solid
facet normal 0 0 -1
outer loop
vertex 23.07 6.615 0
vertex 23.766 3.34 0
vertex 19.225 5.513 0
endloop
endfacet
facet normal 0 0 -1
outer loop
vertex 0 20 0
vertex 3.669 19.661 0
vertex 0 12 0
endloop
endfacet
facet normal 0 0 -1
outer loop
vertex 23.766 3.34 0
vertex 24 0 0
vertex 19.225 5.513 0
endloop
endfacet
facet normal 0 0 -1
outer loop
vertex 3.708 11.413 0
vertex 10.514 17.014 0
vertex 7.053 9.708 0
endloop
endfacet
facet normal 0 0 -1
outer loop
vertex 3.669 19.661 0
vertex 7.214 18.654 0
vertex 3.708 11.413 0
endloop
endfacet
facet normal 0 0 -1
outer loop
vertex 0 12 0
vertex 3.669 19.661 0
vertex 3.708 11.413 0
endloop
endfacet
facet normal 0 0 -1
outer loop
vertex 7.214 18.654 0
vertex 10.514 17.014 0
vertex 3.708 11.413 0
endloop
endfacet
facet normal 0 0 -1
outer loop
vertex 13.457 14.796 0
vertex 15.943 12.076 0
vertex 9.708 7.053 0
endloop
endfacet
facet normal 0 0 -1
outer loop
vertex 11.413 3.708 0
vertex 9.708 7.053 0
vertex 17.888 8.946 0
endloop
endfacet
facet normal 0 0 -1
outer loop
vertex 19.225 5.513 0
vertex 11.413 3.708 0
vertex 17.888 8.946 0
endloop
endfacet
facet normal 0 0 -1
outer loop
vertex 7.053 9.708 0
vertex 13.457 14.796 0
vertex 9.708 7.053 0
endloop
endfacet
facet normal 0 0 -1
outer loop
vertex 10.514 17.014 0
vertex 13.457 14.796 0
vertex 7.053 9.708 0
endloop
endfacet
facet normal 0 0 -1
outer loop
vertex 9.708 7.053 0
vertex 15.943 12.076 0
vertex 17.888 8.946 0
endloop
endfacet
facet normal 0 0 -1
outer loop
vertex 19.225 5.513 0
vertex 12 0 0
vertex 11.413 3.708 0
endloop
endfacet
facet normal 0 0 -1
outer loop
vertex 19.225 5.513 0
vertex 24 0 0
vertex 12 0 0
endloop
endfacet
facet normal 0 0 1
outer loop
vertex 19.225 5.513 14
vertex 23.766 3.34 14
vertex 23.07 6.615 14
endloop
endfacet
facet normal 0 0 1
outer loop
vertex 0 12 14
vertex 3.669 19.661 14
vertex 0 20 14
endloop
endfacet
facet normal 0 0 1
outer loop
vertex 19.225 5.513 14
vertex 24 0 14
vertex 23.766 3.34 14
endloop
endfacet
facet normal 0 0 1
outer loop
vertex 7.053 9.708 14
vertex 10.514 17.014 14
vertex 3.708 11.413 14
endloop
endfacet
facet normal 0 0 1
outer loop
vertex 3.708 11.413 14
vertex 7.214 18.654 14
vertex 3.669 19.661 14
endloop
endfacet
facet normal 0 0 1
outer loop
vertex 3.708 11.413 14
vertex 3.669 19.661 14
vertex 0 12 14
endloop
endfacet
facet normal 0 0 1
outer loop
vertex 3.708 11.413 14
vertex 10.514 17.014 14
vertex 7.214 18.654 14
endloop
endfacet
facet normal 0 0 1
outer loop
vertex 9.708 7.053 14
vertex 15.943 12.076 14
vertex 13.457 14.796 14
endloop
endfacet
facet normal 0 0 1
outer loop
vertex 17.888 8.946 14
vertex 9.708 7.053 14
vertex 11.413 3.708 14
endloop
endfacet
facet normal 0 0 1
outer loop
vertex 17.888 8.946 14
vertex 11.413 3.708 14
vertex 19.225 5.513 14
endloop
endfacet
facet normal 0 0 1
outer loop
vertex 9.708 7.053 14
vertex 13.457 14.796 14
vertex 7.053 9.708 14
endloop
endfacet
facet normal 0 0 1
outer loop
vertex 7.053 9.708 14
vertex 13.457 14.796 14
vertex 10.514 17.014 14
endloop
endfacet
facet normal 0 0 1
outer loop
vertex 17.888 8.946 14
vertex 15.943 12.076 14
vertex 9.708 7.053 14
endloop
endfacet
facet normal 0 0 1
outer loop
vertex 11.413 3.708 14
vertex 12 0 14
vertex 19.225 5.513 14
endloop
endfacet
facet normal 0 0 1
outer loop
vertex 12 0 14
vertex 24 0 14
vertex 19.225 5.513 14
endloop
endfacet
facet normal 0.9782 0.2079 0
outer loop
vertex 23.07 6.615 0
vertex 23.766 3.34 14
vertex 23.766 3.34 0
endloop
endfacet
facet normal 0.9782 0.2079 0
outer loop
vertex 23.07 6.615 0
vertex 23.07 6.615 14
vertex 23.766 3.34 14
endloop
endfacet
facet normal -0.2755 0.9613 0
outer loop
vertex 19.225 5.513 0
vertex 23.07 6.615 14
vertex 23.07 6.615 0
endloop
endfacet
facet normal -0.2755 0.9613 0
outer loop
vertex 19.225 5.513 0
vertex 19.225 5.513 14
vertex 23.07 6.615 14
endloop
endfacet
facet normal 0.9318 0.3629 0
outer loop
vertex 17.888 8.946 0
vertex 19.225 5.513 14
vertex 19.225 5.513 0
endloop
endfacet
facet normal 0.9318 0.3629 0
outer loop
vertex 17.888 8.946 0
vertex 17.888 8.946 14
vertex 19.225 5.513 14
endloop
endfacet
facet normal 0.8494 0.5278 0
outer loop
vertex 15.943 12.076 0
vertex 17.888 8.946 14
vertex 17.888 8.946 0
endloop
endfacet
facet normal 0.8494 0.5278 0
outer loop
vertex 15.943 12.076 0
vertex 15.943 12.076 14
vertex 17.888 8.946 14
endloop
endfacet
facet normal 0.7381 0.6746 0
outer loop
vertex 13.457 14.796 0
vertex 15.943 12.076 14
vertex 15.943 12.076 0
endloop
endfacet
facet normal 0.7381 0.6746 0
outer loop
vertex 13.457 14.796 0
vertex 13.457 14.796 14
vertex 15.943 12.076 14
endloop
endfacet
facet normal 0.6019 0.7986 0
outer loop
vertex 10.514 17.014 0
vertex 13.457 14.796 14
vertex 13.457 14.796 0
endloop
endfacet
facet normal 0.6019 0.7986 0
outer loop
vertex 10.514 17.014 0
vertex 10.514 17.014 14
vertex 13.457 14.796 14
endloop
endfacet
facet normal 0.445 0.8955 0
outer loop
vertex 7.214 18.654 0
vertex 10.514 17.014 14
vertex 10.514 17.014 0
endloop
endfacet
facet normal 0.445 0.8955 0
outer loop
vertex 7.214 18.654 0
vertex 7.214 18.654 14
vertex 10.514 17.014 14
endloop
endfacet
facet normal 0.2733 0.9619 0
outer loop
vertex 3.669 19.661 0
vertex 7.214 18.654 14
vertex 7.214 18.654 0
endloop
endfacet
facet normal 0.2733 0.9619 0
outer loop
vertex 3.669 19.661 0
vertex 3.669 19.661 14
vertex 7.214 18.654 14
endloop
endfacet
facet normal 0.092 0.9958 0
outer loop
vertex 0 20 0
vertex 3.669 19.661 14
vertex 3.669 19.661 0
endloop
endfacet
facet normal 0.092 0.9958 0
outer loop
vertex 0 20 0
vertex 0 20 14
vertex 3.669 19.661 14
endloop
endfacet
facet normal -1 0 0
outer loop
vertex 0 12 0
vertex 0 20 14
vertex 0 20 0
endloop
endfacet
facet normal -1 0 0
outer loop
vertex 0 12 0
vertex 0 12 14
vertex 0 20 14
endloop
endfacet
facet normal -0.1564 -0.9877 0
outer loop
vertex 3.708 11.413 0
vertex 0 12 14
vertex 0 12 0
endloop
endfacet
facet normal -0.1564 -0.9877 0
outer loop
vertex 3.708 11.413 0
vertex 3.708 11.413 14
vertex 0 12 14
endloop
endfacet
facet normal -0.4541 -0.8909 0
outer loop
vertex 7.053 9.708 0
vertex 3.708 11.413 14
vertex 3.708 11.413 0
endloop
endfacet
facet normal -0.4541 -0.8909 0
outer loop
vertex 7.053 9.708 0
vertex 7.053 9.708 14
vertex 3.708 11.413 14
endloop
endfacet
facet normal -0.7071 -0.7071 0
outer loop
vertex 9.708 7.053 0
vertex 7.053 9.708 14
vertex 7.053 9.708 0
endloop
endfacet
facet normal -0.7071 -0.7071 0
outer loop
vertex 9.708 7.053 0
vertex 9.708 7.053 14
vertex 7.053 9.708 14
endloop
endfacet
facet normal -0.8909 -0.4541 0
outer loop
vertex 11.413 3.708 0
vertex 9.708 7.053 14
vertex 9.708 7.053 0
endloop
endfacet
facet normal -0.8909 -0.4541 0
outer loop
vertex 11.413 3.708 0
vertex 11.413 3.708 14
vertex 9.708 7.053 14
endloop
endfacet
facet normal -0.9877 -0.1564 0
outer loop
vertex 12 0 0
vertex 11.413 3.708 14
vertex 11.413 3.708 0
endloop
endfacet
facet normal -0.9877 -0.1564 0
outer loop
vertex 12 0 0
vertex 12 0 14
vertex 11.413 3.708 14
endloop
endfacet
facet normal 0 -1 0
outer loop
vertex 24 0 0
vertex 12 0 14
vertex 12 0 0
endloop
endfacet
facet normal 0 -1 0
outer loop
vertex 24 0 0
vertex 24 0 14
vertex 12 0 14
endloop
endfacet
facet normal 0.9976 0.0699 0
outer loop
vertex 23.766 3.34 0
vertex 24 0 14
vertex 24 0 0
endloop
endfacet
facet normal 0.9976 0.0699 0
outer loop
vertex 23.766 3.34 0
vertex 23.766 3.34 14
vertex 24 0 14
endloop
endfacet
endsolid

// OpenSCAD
$fn = 32;

// ----------------------------------------------------------------------
// Arc stop: segment, 14 mm thick
// ----------------------------------------------------------------------

// --- parameters (mm) ---
profile_height = 14;      // extrusion height
profile_points = 17;      // points of the closed outline

profile = [[24, 0], [23.766, 3.34], [23.07, 6.615], [19.225, 5.513], [17.888, 8.946], [15.943, 12.076], [13.457, 14.796], [10.514, 17.014], [7.214, 18.654], [3.669, 19.661], [0, 20], [0, 12], [3.708, 11.413], [7.053, 9.708], [9.708, 7.053], [11.413, 3.708], [12, 0]];  // single closed polygon, 17 points, counter clockwise

// --- the one profile operation ---
linear_extrude(height = profile_height) polygon(points = profile);
